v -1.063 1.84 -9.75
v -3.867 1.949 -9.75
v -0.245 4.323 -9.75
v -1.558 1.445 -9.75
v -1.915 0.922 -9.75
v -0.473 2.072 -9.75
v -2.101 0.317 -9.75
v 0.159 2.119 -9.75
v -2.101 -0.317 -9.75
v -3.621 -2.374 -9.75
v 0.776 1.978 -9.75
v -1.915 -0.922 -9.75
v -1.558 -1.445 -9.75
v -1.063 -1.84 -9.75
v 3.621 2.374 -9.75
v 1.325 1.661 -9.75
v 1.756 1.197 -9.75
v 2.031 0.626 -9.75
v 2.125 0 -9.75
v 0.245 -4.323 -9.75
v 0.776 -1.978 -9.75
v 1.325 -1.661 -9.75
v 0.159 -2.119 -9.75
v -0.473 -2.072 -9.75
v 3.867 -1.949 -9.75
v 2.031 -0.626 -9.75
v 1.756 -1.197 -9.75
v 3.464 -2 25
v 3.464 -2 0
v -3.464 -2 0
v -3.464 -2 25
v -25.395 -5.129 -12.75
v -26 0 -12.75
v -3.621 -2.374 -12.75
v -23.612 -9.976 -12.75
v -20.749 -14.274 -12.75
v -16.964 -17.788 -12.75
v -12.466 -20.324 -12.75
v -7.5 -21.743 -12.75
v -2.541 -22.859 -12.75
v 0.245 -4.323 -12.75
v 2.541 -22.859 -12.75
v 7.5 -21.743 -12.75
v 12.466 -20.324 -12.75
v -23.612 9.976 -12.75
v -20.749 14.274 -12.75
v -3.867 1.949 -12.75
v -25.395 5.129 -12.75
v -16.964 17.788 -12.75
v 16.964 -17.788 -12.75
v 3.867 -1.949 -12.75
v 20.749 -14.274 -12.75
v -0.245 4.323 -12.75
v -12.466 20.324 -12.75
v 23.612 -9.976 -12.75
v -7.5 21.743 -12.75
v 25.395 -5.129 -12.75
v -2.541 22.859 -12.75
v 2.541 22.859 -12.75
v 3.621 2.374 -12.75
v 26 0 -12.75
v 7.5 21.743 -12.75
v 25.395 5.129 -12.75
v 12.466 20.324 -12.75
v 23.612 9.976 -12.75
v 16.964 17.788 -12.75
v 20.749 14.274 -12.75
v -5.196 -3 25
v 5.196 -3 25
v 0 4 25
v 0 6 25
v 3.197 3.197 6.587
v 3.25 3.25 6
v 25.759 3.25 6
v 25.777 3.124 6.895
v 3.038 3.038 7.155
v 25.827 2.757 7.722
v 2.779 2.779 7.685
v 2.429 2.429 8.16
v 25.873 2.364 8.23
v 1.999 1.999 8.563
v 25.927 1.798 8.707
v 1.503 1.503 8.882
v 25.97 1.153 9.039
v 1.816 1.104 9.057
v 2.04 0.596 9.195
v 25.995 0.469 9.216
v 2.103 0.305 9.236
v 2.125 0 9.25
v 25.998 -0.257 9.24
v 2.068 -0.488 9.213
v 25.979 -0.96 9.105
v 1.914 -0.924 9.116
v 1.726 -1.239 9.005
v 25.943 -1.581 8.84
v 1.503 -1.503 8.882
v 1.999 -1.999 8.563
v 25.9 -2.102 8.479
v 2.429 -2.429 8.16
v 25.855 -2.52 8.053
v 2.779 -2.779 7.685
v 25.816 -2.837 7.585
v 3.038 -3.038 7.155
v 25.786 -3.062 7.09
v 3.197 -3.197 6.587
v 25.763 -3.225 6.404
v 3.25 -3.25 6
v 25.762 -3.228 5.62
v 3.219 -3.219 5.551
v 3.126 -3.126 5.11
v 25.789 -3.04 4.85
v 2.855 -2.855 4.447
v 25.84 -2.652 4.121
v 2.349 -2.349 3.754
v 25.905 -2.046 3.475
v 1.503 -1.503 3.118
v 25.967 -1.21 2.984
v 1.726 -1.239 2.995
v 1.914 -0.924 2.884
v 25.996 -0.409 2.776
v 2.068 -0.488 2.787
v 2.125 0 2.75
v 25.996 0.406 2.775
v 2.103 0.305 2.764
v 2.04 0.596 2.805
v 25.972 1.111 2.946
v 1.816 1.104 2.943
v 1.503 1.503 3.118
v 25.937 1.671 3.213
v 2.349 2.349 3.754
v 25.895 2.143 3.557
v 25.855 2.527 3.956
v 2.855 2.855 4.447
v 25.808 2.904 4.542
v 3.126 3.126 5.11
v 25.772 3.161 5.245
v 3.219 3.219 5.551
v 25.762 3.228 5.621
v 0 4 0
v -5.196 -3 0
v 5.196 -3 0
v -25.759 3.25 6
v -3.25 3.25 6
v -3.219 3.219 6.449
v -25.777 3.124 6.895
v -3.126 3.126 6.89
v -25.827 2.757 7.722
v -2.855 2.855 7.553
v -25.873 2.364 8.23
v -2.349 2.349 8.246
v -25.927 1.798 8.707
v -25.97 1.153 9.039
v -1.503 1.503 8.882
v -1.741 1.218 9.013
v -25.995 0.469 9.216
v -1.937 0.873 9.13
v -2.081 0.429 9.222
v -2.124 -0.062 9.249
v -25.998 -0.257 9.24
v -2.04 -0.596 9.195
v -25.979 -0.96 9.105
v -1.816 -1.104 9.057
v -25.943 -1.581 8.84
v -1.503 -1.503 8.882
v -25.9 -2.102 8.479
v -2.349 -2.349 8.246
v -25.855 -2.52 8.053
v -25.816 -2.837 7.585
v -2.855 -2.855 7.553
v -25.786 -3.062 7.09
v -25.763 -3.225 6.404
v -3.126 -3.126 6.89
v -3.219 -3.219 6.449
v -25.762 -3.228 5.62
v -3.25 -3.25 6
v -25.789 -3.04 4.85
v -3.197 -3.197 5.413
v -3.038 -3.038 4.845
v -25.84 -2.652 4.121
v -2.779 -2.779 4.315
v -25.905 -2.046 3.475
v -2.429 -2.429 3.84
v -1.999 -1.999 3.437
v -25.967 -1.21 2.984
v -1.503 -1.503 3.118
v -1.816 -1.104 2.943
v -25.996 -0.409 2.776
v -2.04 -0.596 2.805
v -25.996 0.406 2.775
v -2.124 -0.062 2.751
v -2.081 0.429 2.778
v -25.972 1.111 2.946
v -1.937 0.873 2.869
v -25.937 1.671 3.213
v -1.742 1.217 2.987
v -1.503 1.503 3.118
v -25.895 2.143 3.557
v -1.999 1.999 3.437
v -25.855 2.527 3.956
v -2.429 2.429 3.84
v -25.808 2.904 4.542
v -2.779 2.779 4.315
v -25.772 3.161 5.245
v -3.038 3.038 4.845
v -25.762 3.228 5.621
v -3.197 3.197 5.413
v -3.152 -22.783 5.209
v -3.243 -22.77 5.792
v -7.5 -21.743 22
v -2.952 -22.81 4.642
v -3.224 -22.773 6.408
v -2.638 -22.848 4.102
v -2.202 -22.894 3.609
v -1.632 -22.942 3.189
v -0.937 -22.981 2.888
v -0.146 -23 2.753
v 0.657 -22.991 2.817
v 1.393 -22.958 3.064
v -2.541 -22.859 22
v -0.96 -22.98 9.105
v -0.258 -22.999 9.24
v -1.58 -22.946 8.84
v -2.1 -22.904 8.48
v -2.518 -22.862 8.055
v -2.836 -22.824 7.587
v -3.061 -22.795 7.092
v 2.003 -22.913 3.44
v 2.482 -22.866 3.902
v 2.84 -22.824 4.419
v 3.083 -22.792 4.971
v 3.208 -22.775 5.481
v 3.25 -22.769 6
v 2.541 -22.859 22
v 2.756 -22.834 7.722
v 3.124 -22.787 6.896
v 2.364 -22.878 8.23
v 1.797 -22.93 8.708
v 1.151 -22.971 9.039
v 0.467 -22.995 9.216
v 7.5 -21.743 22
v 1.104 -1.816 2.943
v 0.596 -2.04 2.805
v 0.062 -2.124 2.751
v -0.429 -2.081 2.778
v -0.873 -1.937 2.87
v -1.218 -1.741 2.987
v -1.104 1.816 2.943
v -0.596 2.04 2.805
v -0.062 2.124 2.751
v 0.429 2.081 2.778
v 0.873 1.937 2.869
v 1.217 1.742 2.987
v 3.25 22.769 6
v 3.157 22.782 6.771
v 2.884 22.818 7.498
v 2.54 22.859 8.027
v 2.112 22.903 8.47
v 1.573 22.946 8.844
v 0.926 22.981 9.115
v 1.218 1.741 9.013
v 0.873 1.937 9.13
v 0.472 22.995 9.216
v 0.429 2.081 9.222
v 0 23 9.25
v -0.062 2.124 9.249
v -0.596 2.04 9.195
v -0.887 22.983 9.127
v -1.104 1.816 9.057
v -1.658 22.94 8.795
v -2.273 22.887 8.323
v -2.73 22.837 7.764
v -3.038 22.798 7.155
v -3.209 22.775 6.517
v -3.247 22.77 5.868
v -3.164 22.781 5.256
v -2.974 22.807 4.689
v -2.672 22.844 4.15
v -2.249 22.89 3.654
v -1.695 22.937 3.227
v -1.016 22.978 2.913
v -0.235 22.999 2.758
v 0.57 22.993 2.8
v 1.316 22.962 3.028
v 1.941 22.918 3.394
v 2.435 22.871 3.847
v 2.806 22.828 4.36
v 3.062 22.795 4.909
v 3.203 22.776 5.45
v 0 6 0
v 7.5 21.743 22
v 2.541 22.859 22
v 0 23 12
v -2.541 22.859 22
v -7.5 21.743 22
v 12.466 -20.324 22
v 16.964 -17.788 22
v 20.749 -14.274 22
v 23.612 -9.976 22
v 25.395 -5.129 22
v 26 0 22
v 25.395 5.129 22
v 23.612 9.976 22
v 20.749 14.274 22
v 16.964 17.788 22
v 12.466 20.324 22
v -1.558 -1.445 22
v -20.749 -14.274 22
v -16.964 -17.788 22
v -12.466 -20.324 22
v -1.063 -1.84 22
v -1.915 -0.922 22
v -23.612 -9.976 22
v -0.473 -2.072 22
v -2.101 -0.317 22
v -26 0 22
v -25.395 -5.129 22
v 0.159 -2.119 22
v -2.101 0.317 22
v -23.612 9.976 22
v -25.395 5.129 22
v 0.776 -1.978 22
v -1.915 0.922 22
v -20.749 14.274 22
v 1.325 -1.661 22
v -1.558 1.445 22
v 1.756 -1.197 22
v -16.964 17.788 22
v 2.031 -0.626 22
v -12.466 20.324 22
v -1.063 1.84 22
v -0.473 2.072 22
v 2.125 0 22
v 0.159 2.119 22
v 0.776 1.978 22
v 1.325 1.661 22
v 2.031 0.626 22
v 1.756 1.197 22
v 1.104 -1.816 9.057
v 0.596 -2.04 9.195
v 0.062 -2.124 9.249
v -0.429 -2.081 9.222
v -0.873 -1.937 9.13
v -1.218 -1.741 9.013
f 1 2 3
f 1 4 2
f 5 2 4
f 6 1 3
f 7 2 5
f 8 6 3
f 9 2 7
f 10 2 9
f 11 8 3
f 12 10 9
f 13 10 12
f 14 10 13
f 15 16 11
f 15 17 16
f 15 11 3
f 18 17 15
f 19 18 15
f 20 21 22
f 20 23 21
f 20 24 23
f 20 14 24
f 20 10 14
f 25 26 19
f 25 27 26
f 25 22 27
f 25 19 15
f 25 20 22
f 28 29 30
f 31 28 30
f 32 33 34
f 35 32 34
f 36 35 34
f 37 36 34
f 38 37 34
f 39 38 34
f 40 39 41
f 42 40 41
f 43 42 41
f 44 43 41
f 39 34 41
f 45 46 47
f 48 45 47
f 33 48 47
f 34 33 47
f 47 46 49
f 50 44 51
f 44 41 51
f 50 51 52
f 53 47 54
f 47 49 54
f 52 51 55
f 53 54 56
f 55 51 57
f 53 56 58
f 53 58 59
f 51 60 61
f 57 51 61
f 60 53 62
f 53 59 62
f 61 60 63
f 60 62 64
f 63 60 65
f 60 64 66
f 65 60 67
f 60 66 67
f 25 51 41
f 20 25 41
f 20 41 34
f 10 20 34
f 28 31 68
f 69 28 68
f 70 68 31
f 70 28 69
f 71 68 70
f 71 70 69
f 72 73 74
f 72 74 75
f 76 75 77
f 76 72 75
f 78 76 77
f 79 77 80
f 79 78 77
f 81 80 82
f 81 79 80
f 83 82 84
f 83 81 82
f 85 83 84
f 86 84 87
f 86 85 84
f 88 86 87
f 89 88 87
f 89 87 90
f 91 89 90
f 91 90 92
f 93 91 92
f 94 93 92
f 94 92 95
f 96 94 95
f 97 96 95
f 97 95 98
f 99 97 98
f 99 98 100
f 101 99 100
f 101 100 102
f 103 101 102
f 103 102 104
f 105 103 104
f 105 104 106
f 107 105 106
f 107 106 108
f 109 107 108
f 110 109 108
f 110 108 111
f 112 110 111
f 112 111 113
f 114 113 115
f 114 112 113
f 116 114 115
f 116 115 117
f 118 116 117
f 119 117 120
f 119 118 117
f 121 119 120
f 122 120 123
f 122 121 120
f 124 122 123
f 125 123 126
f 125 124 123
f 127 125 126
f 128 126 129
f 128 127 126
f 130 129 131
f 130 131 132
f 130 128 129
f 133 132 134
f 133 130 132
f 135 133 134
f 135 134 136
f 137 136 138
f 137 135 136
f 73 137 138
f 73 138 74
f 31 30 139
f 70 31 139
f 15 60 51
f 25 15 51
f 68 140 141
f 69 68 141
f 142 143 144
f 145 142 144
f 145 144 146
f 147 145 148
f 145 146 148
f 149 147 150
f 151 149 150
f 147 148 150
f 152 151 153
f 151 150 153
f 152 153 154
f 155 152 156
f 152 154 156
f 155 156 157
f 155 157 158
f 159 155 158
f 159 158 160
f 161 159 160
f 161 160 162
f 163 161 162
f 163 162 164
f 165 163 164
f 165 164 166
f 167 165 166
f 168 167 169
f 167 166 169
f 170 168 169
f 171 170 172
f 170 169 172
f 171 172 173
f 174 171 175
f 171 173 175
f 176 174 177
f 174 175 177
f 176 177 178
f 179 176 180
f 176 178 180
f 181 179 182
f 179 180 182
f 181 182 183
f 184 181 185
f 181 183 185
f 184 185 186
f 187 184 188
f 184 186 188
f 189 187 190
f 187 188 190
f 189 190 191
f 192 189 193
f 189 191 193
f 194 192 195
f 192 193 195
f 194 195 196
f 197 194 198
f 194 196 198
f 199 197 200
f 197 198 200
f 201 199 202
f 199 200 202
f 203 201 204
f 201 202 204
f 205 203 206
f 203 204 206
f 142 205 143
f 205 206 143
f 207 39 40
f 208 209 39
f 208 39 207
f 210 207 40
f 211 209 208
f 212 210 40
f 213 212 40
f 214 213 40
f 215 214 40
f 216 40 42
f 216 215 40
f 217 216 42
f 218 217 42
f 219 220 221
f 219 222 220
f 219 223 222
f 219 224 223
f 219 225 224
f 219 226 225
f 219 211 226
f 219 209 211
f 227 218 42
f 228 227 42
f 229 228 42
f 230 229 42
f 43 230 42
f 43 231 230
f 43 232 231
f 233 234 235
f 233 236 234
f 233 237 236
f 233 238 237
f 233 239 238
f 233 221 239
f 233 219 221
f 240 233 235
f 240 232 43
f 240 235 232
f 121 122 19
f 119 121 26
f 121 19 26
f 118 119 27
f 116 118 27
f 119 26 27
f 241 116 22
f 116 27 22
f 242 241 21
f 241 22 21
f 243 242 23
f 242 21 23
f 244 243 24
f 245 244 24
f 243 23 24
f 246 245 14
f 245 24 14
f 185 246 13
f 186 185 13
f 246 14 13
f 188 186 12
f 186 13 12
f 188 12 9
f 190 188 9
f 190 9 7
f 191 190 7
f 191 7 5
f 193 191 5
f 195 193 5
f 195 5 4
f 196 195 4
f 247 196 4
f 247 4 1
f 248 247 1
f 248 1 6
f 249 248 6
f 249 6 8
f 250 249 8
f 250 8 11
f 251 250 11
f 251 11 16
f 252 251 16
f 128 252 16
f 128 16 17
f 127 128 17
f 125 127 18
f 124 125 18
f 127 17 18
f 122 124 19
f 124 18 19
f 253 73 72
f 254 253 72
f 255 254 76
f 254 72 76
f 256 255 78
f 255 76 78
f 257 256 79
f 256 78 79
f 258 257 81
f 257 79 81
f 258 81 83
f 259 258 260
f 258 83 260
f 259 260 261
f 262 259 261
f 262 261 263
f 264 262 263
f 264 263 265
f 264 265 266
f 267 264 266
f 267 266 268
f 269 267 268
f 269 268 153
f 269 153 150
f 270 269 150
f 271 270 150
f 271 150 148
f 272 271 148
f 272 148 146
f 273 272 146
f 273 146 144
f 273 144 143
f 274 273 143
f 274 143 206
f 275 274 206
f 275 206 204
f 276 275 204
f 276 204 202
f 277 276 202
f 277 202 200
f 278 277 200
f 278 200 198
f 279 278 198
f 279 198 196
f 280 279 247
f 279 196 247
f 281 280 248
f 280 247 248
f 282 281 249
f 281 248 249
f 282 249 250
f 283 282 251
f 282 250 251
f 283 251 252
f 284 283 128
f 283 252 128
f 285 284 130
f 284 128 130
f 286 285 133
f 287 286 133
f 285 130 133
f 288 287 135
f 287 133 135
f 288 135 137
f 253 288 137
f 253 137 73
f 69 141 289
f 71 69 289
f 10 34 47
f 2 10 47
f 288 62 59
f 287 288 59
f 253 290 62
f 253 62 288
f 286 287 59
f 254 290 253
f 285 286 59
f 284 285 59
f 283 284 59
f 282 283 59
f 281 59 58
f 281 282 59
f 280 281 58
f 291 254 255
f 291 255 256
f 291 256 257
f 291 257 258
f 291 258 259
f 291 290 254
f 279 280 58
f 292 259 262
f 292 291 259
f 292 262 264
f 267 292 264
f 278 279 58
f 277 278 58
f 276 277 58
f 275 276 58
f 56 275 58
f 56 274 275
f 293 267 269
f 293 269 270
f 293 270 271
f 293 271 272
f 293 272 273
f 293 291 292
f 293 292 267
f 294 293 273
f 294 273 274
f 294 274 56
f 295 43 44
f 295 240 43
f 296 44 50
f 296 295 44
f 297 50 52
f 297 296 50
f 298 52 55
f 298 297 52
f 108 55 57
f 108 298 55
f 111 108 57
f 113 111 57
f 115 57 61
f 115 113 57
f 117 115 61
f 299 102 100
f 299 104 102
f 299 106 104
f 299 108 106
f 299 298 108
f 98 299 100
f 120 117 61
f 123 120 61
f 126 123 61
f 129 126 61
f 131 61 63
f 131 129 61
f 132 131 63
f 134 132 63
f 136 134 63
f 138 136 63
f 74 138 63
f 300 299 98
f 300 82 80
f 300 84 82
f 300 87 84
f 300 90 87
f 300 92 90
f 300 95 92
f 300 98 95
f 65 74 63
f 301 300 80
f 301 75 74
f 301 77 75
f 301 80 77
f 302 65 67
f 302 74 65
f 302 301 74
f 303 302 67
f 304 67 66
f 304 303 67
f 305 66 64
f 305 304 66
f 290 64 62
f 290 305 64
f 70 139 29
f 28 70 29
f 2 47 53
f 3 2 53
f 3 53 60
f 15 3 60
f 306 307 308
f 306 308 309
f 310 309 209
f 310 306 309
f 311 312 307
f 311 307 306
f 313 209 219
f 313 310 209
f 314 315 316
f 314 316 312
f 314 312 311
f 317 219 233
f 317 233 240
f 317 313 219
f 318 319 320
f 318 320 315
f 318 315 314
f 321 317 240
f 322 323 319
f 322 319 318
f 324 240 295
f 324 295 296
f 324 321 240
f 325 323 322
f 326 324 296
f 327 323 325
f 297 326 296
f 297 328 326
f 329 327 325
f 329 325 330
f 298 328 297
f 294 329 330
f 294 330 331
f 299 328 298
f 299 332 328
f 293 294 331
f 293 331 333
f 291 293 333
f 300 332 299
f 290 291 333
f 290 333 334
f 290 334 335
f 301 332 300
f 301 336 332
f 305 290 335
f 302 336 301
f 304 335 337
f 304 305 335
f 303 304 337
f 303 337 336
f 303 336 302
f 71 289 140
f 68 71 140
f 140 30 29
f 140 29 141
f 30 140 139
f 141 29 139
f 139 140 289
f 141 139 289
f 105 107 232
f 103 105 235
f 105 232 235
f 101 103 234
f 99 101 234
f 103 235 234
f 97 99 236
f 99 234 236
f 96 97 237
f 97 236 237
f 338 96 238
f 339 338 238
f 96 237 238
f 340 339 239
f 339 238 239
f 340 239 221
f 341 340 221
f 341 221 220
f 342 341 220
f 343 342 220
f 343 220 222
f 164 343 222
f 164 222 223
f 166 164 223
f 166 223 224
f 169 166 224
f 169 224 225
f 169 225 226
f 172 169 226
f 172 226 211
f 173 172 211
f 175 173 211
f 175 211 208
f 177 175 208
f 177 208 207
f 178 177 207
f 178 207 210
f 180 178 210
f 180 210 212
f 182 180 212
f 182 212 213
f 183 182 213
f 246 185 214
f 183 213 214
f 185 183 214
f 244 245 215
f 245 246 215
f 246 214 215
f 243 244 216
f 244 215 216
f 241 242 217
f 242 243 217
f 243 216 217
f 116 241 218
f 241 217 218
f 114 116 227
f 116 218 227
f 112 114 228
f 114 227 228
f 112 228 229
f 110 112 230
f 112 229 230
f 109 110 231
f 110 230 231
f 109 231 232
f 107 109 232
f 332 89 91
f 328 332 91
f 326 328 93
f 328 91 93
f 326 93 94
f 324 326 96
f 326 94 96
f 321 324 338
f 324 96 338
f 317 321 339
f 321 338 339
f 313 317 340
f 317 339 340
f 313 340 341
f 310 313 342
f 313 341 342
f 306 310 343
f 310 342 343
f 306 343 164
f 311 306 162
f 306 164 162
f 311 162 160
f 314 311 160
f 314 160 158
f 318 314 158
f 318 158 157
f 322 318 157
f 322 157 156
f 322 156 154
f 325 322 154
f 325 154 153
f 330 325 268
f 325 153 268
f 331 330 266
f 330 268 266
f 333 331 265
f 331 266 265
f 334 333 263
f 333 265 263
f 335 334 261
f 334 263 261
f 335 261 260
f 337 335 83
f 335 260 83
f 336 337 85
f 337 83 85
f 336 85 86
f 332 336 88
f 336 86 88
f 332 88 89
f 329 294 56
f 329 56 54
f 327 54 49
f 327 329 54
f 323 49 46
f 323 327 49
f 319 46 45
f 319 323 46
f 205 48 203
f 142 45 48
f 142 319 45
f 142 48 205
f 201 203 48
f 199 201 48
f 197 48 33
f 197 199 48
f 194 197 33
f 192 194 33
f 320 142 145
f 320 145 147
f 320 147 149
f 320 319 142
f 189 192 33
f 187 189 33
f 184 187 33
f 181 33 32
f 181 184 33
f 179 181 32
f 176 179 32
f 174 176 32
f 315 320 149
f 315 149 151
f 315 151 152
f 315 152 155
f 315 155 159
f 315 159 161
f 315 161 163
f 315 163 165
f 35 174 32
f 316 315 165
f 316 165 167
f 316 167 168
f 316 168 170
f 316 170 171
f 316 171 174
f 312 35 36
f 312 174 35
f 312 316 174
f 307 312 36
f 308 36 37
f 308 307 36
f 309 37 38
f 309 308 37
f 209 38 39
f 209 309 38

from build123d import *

# Parameters (mm, degrees)
F1_DEPTH       = 12
F3_R           = 3.25
F4_DEPTH       = 25
F4_DEPTH_BACK  = 25
F6_DEPTH       = 25
F12_DEPTH      = 22
F12_DEPTH_BACK = 12.75
F13_DEPTH      = 25
F13_DEPTH_BACK = 25
F14_R          = 3.25
F15_DEPTH      = 30
F15_DEPTH_BACK = 30
F16_R          = 2.125
F17_DEPTH      = 50
F18_DEPTH      = 3


# Not quite as in the source:
# - a feature of the source that left no trace in its solid (it failed there, or was rolled back) is left out
# - a feature names something its author has since deleted; it is built from what else it names


with BuildPart() as f1:
    # F0 (on Top) → F1 (new body)
    with BuildSketch(Plane.XY):
        with BuildLine():
            ThreePointArc((-11.87, 16.0966797819), (0, 20), (11.87, 16.0966797819))
            ThreePointArc((11.87, 16.0966797819), (0, 23), (-11.87, 16.0966797819))
        make_face()
        with BuildLine():
            ThreePointArc((-19.8751336077, 2.231381652), (-19.918584287, -11.5), (-8.0051336077, -18.3280614339))
            ThreePointArc((-8.0051336077, -18.3280614339), (-17.3205080757, -10), (-19.8751336077, 2.231381652))
        make_face()
        with BuildLine():
            ThreePointArc((19.8751336077, 2.231381652), (19.9687590019, 1.1174363173), (20, 0))
            ThreePointArc((20, 0), (16.7347344191, -10.9521077388), (8.0051336077, -18.3280614339))
            ThreePointArc((8.0051336077, -18.3280614339), (19.918584287, -11.5), (19.8751336077, 2.231381652))
        make_face()
        with BuildLine():
            ThreePointArc((8.0051336077, -18.3280614339), (16.7347344191, -10.9521077388), (20, 0))
            ThreePointArc((20, 0), (19.9687590019, 1.1174363173), (19.8751336077, 2.231381652))
            ThreePointArc((19.8751336077, 2.231381652), (17.3205080757, 10), (11.87, 16.0966797819))
            ThreePointArc((11.87, 16.0966797819), (0, 20), (-11.87, 16.0966797819))
            ThreePointArc((-11.87, 16.0966797819), (-17.3205080757, 10), (-19.8751336077, 2.231381652))
            ThreePointArc((-19.8751336077, 2.231381652), (-17.3205080757, -10), (-8.0051336077, -18.3280614339))
            ThreePointArc((-8.0051336077, -18.3280614339), (0, -20), (8.0051336077, -18.3280614339))
        make_face()
    extrude(amount=F1_DEPTH)

    # F3 (on offset) → F4 (cut, two sides)
    with BuildSketch(Plane.XZ) as f4_sk:
        with Locations((0, 6)):
            Circle(F3_R)
    extrude(amount=F4_DEPTH, mode=Mode.SUBTRACT)
    extrude(f4_sk.sketch, amount=-F4_DEPTH_BACK, mode=Mode.SUBTRACT)

    # F11 (on Top) → F12 (join, two sides)
    with BuildSketch(Plane.XY) as f12_sk:
        with BuildLine():
            ThreePointArc((7.5, -21.7428149052), (18.7283208003, -13.3510299228), (23, 0))
            ThreePointArc((23, 0), (18.7283208003, 13.3510299228), (7.5, 21.7428149052))
            ThreePointArc((7.5, 21.7428149052), (0, 23), (-7.5, 21.7428149052))
            ThreePointArc((-7.5, 21.7428149052), (-23, 0), (-7.5, -21.7428149052))
            ThreePointArc((-7.5, -21.7428149052), (0, -23), (7.5, -21.7428149052))
        make_face()
        with BuildLine():
            ThreePointArc((-7.5, -21.7428149052), (-23, 0), (-7.5, 21.7428149052))
            ThreePointArc((-7.5, 21.7428149052), (-26, 0), (-7.5, -21.7428149052))
        make_face()
        with BuildLine():
            ThreePointArc((7.5, 21.7428149052), (18.7283208003, 13.3510299228), (23, 0))
            ThreePointArc((23, 0), (18.7283208003, -13.3510299228), (7.5, -21.7428149052))
            ThreePointArc((7.5, -21.7428149052), (26, 0), (7.5, 21.7428149052))
        make_face()
    extrude(amount=F12_DEPTH)
    extrude(f12_sk.sketch, amount=-F12_DEPTH_BACK)

    # F3 (on offset) → F13 (cut, two sides)
    with BuildSketch(Plane.XZ) as f13_sk:
        with Locations((0, 6)):
            Circle(F3_R)
    extrude(amount=-F13_DEPTH, mode=Mode.SUBTRACT)
    extrude(f13_sk.sketch, amount=F13_DEPTH_BACK, mode=Mode.SUBTRACT)

    # F14 (on Right) → F15 (cut, two sides)
    with BuildSketch(Plane.YZ) as f15_sk:
        with Locations((0, 6)):
            Circle(F14_R)
    extrude(amount=-F15_DEPTH, mode=Mode.SUBTRACT)
    extrude(f15_sk.sketch, amount=F15_DEPTH_BACK, mode=Mode.SUBTRACT)

    # F16 (on face) → F17 (cut)
    with BuildSketch(Plane(origin=(0, 0, -12.75), x_dir=(1, 0, 0), z_dir=(0, 0, -1))):
        Circle(F16_R)
    extrude(amount=-F17_DEPTH, mode=Mode.SUBTRACT)

    # F16 (on face) → F18 (cut)
    with BuildSketch(Plane(origin=(0, 0, -12.75), x_dir=(1, 0, 0), z_dir=(0, 0, -1))):
        Polygon((-0.2451741669, -4.3231804991), (3.6213970539, -2.3739173065), (3.8665712208, 1.9492631926), (0.2451741669, 4.3231804991), (-3.6213970539, 2.3739173065), (-3.8665712208, -1.9492631926), align=None)
        Circle(F16_R, mode=Mode.SUBTRACT)
    extrude(amount=-F18_DEPTH, mode=Mode.SUBTRACT)


with BuildPart() as f6:
    # F5 (on Top) → F6 (new body)
    with BuildSketch(Plane.XY):
        Polygon((-5.1961524227, -3), (5.1961524227, -3), (0, 6), align=None)
        Polygon((0, 4), (3.4641016151, -2), (-3.4641016151, -2), align=None, mode=Mode.SUBTRACT)
    extrude(amount=F6_DEPTH)


solid = Compound([f1.part, f6.part])
